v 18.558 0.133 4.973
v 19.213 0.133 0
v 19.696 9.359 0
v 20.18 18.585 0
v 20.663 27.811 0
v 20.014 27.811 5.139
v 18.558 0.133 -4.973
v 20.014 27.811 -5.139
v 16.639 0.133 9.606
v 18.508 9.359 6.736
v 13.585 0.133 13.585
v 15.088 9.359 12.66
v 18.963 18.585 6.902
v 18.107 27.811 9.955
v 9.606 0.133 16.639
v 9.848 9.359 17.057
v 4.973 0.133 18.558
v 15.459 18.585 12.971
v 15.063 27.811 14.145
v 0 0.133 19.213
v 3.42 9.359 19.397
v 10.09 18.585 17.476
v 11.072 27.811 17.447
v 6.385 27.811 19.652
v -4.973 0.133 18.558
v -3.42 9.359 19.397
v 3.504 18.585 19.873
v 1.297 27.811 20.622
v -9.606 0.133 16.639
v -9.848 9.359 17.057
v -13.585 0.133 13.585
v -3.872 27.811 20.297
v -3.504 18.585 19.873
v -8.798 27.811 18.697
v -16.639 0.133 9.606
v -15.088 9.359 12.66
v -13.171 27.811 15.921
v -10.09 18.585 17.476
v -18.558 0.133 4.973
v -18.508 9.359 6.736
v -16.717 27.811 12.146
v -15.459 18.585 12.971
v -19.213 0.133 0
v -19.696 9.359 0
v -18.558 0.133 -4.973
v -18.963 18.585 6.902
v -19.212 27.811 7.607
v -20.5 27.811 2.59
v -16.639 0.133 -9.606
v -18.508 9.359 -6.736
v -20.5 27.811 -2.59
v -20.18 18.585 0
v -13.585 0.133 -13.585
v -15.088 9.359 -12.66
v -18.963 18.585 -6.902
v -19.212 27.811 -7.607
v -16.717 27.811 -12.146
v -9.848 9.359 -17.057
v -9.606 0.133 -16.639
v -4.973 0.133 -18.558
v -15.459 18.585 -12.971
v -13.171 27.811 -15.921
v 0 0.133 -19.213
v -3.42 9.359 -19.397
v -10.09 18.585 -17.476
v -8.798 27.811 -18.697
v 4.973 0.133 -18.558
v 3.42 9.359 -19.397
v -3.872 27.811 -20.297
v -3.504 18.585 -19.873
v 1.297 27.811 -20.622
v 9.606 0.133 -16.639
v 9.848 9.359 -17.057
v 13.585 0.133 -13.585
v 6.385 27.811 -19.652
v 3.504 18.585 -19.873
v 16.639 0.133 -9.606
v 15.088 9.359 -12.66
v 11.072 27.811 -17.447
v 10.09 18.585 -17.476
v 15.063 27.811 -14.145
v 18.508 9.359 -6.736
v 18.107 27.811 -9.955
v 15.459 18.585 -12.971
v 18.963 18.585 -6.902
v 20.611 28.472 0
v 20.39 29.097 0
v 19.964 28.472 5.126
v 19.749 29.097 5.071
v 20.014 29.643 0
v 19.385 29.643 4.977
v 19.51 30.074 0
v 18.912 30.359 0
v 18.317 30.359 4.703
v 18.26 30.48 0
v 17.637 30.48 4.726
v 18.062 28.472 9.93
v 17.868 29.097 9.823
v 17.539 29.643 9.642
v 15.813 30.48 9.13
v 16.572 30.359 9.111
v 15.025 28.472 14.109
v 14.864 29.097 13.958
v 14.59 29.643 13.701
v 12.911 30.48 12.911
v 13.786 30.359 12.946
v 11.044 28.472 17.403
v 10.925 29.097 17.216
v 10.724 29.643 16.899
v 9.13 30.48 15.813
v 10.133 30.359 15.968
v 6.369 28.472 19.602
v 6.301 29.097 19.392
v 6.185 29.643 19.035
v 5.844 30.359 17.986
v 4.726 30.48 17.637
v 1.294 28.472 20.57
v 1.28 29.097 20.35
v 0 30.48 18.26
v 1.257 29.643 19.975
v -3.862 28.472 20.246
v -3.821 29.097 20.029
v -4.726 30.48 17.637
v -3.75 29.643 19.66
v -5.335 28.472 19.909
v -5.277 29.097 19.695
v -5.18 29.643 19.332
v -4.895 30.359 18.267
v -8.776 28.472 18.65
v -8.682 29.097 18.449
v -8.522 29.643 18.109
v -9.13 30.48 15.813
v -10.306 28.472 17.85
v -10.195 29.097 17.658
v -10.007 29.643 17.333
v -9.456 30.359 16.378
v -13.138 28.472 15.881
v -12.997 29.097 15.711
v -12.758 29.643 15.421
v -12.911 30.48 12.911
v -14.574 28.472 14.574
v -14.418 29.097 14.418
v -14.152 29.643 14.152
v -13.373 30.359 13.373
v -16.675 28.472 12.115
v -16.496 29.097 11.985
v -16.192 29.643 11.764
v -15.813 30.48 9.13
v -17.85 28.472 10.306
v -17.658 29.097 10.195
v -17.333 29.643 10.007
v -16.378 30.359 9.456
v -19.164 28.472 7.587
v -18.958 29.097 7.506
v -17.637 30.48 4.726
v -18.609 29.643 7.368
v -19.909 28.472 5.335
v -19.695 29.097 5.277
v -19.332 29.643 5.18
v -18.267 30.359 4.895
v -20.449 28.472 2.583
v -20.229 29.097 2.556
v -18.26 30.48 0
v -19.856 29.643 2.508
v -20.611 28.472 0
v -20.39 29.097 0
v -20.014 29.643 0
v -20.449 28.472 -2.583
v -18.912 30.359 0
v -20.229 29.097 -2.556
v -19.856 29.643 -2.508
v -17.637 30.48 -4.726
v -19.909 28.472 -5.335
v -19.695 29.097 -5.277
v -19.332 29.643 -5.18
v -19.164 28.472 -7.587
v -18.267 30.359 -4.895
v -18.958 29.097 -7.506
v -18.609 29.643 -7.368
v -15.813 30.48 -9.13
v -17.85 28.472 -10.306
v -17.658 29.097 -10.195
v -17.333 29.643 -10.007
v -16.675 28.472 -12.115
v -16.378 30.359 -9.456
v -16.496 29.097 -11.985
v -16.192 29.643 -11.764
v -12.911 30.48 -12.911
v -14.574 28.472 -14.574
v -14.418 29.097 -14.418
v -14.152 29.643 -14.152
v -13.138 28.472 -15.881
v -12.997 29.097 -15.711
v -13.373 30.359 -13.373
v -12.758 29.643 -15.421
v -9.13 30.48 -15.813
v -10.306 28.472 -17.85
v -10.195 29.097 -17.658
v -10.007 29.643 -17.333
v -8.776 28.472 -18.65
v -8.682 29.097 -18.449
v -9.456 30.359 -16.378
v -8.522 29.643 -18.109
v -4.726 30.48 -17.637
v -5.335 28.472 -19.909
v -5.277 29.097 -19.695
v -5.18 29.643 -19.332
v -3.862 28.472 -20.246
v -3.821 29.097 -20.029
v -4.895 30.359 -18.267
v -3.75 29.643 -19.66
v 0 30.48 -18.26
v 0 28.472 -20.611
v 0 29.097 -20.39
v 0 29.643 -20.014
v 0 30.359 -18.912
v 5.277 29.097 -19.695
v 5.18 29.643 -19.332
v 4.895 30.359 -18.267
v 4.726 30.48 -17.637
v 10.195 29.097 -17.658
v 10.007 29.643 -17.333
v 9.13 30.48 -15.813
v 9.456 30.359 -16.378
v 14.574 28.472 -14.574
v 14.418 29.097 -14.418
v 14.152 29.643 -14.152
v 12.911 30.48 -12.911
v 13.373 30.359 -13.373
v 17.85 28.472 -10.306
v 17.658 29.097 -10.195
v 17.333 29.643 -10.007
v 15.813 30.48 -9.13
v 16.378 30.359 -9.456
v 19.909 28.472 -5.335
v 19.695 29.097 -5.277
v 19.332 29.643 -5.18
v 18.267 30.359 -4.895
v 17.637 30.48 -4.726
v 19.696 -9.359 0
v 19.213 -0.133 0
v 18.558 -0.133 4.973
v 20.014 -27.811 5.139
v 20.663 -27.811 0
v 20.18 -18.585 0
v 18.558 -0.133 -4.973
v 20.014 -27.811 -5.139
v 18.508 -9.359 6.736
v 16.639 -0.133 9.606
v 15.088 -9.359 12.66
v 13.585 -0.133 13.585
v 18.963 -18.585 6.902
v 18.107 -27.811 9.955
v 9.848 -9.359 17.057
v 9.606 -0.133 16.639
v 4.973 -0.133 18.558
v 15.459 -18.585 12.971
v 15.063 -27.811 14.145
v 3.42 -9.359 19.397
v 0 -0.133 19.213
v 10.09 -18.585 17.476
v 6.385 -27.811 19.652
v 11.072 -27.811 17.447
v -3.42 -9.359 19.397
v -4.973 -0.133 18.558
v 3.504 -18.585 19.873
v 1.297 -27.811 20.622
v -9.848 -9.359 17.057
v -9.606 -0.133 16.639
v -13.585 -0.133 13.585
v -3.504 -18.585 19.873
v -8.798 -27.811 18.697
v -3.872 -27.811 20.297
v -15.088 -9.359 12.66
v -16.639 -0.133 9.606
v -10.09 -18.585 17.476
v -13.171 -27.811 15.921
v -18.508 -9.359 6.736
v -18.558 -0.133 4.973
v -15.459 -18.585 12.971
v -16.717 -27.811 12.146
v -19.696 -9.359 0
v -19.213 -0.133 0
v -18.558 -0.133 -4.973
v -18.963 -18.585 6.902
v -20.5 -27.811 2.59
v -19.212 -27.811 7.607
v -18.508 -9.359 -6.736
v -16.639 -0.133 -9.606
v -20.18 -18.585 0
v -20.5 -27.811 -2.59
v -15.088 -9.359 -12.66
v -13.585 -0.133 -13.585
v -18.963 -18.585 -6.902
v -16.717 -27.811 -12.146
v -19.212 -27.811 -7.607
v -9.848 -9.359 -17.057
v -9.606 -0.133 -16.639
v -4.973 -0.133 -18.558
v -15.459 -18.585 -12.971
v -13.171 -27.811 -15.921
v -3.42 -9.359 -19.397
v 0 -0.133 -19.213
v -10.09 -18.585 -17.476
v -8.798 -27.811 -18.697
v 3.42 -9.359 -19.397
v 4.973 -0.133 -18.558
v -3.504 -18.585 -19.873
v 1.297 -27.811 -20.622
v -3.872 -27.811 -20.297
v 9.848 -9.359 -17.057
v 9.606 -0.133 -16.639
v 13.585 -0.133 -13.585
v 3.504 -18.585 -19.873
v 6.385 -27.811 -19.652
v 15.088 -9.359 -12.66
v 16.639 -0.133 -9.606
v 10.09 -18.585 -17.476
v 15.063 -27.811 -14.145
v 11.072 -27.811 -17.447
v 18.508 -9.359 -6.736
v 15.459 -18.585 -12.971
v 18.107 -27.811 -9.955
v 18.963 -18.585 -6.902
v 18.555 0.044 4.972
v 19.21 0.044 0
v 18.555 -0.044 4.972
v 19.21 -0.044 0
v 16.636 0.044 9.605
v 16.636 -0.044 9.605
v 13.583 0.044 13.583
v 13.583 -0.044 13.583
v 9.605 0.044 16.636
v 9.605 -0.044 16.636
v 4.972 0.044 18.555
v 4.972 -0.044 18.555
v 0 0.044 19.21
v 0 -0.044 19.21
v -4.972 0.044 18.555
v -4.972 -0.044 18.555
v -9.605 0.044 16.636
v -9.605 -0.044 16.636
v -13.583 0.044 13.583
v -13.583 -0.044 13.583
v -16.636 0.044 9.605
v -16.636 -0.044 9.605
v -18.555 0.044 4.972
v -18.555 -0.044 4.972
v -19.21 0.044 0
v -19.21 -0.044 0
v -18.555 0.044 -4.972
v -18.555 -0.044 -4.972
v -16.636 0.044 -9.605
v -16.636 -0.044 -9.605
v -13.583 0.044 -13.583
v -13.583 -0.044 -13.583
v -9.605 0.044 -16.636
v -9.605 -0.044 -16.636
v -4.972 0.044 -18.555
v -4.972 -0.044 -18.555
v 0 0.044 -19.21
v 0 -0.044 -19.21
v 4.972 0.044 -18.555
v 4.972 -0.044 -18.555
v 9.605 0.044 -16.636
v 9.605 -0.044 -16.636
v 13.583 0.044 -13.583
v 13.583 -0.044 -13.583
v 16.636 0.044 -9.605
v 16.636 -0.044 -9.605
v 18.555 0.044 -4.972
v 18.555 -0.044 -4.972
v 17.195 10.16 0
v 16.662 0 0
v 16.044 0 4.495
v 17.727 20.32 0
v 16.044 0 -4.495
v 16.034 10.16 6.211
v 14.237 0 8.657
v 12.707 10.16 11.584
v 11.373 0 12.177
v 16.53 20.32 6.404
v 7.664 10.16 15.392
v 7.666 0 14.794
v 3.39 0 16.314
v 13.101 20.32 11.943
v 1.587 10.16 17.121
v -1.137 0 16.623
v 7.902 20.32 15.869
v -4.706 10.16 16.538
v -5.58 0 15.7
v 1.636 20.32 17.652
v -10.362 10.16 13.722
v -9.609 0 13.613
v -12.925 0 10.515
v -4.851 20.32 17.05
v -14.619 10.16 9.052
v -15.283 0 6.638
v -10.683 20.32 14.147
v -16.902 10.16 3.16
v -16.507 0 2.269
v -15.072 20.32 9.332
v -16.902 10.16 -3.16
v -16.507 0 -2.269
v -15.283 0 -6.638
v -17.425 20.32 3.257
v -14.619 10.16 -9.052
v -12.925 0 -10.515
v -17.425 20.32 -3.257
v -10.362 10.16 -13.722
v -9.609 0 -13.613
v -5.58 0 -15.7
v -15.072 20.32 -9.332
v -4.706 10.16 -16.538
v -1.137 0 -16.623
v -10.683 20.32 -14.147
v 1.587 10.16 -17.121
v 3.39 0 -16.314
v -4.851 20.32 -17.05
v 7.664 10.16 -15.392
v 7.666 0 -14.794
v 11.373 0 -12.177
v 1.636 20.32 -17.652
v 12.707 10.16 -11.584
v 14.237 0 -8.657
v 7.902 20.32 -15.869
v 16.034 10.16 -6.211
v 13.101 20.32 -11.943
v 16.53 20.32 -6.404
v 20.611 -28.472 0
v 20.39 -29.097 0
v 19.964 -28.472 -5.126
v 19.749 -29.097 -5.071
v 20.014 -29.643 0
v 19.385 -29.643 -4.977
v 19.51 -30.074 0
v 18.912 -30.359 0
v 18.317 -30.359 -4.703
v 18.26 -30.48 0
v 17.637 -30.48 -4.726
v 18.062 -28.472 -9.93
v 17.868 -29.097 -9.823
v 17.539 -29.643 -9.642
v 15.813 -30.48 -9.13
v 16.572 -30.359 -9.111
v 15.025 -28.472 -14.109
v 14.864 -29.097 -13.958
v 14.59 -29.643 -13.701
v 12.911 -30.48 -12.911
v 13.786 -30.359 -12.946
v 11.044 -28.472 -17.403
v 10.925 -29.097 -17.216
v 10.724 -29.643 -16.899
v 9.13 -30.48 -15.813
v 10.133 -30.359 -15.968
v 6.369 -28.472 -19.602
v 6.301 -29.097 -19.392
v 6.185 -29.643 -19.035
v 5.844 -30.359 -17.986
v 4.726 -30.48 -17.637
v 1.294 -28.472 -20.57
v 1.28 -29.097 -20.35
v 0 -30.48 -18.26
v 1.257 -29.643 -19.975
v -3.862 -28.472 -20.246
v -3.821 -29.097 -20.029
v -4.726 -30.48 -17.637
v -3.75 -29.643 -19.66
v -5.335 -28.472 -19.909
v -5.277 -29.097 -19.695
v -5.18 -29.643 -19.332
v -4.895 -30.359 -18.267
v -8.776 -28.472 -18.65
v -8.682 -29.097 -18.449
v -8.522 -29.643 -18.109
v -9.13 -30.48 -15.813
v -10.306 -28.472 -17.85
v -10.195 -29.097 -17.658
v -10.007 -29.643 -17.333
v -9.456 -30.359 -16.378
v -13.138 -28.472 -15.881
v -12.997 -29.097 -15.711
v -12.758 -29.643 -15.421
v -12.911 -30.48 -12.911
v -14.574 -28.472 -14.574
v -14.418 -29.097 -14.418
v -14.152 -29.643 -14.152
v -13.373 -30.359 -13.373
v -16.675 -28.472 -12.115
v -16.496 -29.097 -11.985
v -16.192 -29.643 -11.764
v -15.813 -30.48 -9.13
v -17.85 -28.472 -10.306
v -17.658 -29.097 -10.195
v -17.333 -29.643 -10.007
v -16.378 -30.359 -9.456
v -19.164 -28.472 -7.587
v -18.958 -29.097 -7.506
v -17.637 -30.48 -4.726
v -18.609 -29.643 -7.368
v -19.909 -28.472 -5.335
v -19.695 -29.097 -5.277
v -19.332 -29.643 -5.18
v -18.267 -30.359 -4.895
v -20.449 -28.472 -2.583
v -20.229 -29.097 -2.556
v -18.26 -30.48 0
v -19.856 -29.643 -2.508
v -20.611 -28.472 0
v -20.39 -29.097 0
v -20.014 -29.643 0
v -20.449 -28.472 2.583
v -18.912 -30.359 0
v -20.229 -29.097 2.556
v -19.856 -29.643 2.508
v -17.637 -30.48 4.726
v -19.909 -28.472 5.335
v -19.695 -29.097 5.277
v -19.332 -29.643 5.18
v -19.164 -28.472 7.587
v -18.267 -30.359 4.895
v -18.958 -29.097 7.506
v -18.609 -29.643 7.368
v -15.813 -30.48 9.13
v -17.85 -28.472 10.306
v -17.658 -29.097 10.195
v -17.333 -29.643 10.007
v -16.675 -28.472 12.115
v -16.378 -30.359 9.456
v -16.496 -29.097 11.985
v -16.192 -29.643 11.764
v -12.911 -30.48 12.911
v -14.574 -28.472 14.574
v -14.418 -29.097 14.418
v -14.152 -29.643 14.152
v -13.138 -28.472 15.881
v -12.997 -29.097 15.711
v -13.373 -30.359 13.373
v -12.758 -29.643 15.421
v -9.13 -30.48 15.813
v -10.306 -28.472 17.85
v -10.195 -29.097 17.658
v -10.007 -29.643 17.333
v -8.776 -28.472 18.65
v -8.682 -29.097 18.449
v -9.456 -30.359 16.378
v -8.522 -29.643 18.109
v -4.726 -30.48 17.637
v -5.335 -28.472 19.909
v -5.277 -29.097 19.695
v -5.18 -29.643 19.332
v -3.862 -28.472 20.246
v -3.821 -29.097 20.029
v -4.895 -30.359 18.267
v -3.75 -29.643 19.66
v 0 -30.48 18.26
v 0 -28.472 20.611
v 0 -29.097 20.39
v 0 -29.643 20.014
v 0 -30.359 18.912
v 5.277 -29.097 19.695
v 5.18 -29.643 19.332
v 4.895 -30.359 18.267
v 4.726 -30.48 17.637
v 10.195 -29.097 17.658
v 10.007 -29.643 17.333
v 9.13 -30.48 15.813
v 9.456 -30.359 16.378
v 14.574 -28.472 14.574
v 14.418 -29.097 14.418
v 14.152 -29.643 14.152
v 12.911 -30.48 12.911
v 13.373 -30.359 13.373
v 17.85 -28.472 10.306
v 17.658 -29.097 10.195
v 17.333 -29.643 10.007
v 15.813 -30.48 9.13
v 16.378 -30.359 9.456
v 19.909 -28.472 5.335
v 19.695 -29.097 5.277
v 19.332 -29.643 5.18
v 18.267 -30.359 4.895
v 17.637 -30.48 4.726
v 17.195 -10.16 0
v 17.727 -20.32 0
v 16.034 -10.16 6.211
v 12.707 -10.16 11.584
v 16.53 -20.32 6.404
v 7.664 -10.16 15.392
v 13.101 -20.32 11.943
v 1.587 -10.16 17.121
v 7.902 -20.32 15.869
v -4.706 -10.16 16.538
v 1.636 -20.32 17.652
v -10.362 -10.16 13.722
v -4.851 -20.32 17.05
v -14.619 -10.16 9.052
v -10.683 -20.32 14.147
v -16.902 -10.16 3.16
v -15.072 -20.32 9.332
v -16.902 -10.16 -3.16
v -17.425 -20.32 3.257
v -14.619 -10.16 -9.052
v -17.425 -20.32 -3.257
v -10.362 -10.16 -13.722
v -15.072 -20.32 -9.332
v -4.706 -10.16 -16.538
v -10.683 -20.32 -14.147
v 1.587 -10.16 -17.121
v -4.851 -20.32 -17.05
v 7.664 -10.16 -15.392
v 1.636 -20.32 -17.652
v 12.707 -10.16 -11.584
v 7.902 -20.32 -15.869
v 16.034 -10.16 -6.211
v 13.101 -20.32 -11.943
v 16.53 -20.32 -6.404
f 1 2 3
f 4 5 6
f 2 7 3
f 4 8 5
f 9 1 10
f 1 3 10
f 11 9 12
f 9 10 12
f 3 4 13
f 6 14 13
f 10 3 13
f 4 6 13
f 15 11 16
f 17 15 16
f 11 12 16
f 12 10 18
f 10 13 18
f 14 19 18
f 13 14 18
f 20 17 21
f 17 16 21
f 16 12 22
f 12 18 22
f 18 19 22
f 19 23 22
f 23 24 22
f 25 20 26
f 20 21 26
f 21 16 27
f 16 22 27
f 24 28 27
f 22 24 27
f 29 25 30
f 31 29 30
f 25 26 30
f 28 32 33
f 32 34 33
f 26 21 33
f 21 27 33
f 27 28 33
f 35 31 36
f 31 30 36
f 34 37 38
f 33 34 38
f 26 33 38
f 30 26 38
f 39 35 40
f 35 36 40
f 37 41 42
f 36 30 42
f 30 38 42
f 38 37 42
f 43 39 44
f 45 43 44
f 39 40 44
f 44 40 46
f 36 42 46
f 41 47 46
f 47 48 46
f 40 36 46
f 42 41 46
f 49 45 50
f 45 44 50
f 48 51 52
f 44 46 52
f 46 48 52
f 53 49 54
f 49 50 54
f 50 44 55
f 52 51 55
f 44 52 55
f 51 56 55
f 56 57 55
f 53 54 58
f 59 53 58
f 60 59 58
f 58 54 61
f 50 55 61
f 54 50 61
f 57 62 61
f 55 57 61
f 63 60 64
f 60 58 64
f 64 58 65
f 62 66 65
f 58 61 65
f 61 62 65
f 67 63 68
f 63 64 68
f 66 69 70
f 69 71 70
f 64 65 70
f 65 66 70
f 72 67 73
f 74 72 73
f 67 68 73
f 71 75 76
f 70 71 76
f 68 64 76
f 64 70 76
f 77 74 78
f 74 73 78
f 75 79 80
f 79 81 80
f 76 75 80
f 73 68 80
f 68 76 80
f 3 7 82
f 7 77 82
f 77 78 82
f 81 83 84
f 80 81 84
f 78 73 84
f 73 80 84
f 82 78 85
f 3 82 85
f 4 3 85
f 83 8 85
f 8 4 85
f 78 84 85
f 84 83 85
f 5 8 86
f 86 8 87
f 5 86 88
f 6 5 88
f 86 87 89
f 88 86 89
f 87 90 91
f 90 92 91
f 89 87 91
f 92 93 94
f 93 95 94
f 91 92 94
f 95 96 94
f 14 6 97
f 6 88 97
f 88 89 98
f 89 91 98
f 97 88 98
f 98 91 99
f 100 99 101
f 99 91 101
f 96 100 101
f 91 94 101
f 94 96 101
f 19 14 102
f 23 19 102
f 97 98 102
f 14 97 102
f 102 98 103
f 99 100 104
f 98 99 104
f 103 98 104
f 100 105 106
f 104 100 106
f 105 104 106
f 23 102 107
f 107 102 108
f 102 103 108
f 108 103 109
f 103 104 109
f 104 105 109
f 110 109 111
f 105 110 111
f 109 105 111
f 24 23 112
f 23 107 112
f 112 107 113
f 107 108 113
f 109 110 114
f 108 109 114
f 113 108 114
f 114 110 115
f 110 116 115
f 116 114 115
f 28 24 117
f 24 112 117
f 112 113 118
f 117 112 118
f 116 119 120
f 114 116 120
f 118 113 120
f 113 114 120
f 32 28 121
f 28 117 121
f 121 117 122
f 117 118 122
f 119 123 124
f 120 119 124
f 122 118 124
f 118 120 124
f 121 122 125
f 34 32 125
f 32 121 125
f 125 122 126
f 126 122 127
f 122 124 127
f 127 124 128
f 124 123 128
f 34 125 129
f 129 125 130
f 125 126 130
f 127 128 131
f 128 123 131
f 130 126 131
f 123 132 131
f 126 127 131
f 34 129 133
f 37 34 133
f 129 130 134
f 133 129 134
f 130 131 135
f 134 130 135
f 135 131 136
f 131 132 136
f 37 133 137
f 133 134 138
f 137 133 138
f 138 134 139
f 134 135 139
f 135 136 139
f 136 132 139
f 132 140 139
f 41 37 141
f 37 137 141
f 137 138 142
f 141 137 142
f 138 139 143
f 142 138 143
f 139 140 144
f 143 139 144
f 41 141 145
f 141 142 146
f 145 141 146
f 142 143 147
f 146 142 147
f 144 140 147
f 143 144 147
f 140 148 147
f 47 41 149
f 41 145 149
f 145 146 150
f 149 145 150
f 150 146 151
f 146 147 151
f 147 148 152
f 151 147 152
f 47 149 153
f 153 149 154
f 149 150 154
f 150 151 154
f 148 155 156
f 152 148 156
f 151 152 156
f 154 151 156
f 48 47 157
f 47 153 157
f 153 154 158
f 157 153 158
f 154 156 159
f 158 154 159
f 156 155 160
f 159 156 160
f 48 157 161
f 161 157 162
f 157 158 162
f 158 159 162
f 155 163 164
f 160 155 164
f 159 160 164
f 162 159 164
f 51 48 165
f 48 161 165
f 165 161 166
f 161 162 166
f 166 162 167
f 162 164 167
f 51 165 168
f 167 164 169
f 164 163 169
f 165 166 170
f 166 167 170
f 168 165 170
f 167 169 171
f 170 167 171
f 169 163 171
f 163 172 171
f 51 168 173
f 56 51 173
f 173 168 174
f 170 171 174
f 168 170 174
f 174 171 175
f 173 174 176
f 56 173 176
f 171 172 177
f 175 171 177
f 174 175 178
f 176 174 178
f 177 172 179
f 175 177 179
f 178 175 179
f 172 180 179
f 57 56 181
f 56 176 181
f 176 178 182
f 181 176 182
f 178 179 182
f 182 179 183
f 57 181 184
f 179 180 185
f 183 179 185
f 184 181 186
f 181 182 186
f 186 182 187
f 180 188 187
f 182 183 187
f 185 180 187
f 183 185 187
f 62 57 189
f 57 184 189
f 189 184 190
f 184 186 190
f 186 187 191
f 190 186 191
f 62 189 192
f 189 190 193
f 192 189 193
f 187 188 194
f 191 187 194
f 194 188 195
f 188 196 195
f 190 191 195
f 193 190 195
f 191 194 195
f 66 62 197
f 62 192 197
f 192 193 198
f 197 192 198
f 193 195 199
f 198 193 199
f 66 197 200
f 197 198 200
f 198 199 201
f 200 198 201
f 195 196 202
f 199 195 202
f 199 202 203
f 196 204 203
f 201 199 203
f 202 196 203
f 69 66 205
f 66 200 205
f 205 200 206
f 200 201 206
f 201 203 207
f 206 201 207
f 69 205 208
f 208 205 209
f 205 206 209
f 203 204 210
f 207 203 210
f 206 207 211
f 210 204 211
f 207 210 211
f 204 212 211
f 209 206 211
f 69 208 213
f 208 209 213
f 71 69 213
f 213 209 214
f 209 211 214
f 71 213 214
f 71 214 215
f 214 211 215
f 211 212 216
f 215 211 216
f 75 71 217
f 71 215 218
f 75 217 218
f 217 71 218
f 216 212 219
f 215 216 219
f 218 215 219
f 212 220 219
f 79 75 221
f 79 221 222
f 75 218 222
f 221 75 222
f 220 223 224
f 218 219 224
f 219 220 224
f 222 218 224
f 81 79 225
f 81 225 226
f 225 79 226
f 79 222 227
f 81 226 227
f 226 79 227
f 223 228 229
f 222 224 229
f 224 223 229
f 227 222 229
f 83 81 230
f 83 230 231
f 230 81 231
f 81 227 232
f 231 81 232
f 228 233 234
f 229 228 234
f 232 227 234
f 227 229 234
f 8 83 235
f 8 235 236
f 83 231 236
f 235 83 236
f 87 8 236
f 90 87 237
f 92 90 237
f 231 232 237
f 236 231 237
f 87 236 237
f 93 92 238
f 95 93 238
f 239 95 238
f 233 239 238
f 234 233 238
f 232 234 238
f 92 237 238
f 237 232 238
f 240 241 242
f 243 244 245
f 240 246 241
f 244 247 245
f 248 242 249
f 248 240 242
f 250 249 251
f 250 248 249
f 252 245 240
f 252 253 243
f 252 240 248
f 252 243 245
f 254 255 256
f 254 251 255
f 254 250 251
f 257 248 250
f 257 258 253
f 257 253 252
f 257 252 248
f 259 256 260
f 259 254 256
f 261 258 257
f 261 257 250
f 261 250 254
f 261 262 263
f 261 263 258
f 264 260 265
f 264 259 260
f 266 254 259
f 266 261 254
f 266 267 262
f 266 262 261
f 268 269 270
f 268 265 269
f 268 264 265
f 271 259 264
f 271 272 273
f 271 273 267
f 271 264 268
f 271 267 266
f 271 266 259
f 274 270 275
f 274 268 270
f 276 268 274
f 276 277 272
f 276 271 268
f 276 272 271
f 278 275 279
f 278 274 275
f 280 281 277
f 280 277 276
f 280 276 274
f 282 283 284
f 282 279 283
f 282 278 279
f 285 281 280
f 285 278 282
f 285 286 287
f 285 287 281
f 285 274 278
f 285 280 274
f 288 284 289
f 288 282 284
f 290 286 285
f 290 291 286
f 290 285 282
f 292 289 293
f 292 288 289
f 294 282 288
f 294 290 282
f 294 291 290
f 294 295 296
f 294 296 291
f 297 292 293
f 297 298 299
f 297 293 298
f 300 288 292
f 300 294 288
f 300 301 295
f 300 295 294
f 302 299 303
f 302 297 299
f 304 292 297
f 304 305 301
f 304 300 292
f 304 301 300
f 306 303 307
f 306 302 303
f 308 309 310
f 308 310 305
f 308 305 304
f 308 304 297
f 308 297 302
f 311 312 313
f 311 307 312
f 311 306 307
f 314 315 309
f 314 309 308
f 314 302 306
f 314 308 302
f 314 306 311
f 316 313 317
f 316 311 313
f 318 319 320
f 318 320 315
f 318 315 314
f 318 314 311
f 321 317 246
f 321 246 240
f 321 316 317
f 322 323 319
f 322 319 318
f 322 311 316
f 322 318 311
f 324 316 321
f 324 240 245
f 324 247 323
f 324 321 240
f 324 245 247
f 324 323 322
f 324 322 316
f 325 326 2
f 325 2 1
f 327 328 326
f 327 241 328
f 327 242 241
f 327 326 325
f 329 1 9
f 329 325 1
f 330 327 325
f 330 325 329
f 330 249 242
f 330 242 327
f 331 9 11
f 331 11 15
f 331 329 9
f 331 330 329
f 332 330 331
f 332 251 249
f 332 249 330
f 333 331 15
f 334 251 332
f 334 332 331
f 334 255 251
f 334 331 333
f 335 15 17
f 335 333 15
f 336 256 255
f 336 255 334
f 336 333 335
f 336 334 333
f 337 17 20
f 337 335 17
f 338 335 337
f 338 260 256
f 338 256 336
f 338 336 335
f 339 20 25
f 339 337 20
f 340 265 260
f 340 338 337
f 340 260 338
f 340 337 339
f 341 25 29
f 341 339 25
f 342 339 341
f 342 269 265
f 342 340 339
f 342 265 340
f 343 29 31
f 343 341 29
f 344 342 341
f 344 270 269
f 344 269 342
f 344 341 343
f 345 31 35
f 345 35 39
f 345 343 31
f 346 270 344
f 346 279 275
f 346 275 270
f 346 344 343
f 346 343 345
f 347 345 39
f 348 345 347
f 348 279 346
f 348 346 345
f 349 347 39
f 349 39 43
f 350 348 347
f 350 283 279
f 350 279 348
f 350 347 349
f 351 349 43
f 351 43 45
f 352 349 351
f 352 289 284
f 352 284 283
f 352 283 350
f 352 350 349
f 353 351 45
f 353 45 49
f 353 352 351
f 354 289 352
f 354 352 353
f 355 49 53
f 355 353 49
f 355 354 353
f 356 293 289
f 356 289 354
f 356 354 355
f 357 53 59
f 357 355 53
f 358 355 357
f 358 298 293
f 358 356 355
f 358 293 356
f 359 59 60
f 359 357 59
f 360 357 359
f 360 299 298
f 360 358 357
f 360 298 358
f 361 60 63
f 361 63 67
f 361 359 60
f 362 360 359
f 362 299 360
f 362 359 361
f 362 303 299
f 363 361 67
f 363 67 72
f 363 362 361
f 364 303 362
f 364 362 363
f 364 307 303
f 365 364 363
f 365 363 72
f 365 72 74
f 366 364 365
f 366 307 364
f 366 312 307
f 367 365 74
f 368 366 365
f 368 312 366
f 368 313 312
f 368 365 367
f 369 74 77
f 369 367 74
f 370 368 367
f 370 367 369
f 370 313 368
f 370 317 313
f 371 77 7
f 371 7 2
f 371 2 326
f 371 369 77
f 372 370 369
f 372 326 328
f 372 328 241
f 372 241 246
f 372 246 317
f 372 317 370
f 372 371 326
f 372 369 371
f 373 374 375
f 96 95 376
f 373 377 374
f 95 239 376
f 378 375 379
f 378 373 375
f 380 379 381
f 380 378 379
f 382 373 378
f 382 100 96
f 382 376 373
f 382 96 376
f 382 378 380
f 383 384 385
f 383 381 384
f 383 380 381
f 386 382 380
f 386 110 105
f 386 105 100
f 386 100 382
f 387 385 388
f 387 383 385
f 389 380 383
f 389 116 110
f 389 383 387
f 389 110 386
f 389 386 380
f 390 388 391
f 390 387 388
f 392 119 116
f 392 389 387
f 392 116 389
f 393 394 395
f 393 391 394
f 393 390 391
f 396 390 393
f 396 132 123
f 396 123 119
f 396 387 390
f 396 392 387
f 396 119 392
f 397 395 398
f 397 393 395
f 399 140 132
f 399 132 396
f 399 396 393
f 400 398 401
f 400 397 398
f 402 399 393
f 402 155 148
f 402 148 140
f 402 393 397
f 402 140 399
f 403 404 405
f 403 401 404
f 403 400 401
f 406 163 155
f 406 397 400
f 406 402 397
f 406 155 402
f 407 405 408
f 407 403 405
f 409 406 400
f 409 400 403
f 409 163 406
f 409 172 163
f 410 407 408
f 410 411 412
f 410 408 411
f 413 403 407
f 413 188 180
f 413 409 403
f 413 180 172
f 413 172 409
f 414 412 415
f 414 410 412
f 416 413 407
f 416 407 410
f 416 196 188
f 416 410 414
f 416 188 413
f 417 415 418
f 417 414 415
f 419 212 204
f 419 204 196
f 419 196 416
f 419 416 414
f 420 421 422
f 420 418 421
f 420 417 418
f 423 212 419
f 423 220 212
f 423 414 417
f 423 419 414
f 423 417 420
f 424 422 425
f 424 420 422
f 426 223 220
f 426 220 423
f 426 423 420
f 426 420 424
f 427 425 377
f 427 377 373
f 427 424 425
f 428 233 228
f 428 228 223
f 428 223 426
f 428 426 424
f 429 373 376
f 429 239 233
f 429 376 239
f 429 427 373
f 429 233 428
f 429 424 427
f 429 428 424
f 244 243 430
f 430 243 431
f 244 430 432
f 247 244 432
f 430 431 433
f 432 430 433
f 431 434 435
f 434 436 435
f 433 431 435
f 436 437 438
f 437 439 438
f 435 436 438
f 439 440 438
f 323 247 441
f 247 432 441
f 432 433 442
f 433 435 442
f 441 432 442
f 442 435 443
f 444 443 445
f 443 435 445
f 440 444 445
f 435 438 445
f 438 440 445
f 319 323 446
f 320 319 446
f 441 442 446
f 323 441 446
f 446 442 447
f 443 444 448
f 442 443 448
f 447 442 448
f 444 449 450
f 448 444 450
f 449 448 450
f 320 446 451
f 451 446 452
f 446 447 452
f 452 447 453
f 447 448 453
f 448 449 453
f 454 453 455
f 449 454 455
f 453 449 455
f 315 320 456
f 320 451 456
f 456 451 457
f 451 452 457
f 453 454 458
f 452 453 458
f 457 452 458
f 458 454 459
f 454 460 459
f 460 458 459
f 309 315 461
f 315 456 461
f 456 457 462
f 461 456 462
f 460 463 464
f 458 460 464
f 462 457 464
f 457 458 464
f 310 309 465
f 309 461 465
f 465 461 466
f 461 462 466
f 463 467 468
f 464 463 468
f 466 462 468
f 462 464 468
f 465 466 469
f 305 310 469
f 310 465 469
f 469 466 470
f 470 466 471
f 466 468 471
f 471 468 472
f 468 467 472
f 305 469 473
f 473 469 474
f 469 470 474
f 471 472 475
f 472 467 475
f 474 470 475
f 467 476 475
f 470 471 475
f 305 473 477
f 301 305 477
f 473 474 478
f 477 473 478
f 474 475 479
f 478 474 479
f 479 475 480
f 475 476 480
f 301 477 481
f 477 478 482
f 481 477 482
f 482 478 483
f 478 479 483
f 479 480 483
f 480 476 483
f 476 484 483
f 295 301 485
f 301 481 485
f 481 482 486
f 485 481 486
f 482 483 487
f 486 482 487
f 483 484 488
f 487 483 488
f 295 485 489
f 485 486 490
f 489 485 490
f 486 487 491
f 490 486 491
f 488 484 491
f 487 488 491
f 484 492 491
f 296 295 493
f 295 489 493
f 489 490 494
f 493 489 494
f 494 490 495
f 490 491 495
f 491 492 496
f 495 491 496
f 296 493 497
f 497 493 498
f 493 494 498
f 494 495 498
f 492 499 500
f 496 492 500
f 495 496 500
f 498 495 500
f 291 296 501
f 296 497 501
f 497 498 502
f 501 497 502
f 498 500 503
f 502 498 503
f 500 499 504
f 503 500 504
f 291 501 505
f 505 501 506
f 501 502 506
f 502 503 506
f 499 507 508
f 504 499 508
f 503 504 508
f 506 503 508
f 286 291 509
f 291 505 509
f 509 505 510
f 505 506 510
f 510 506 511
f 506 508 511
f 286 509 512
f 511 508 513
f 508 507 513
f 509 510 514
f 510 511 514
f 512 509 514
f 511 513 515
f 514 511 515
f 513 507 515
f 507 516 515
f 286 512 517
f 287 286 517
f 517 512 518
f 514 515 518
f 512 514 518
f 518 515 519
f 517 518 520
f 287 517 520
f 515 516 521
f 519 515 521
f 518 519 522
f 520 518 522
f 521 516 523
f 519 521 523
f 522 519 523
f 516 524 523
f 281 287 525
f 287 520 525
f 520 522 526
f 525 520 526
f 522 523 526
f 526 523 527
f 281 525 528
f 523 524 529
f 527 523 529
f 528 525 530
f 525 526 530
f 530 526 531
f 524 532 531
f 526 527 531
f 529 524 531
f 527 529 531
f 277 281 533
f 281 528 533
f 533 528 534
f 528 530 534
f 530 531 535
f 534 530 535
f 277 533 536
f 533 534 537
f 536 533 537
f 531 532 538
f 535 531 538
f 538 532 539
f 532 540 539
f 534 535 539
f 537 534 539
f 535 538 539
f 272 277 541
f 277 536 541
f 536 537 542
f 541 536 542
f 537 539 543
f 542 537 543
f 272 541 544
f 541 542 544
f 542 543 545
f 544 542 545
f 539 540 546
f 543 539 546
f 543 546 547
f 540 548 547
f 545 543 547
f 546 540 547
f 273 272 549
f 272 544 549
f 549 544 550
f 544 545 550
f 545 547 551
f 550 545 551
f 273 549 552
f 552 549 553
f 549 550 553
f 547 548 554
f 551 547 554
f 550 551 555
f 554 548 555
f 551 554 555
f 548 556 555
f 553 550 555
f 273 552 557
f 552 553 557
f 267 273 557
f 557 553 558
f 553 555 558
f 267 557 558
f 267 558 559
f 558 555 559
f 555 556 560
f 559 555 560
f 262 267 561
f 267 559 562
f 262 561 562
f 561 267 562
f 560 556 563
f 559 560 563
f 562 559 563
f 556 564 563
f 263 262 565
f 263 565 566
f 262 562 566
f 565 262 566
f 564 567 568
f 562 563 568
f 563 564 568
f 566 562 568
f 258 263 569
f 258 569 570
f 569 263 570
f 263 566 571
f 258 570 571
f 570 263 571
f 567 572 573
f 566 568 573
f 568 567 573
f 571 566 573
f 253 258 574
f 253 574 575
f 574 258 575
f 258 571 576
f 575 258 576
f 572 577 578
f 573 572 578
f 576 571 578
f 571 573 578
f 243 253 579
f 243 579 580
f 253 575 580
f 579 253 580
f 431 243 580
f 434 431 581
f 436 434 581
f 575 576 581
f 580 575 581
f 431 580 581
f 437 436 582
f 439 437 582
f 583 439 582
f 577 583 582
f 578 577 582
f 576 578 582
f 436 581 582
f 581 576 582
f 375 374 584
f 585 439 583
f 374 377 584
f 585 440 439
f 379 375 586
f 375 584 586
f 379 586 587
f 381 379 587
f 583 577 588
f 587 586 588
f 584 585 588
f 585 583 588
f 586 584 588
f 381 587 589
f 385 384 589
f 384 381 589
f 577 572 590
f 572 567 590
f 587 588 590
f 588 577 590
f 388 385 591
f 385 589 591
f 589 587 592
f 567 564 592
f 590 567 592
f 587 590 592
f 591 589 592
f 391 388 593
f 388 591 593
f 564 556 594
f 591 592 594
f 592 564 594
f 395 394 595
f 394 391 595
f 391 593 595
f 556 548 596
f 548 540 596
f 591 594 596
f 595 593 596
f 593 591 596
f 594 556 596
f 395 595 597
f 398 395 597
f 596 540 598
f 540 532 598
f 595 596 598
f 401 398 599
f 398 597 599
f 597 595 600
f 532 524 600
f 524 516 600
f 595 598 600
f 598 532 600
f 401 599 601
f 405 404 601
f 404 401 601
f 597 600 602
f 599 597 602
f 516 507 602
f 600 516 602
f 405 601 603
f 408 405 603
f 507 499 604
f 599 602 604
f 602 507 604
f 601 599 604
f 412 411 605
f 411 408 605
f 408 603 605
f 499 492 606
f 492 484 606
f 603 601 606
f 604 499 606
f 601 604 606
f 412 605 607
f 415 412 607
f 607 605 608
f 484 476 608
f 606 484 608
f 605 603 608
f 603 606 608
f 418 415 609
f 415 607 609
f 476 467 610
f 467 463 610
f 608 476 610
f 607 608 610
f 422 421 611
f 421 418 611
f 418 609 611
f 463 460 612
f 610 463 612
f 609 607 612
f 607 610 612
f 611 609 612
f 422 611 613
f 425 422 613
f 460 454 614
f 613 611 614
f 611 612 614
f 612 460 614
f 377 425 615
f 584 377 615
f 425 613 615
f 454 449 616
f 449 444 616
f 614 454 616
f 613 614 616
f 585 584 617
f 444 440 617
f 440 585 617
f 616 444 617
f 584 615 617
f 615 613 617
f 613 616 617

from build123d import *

# Parameters (mm, degrees)
F0_R          = 19.2057063742
F1_DEPTH      = 30.48
F1_TAPER      = -3
F1_DEPTH_BACK = 30.48
F1_TAPER_BACK = -3
F2_T          = -2.54


# Not quite as in the source:
# - a fillet or chamfer that OpenCascade refuses, or shapes differently, is made with other operations: its cross-section is extruded or revolved along the edge and cut away or added


with BuildPart() as f1:
    # F0 (on Front) → F1 (new body, two sides)
    with BuildSketch(Plane.XZ) as f1_sk:
        Circle(F0_R)
    extrude(amount=F1_DEPTH, taper=F1_TAPER)
    extrude(f1_sk.sketch, amount=-F1_DEPTH_BACK, taper=F1_TAPER_BACK)

    # F2
    f2_openings = [f1.faces().sort_by_distance(p)[0] for p in [
        (0, -30.48, 0),
        (0, 30.48, 0),
    ]]
    offset(amount=F2_T, openings=f2_openings, kind=Kind.INTERSECTION)

    # F3: fillet of radius 2.54 on 3 edges, made by hand

    # F3_s1 → F3_t2 (revolve)
    with BuildSketch(Plane.XY):
        with BuildLine():
            ThreePointArc((19.2126731148, 0.1329333289), (19.2091921331, 0), (19.2126731148, -0.1329333289))
            Line((19.2126731148, -0.1329333289), (19.1619427344, -0.1355919954))
            Line((19.1619427344, -0.1355919954), (19.1548366591, 0))
            Line((19.1548366591, 0), (19.1619427344, 0.1355919954))
            Line((19.1619427344, 0.1355919954), (19.2126731148, 0.1329333289))
        make_face()
    revolve(axis=Axis((0, 0, 0), (0, -1, 0)))

    # F3_s3 → F3_t4 (revolve, cut)
    with BuildSketch(Plane.XY):
        with BuildLine():
            ThreePointArc((20.6631954174, 27.8105476529), (20.0142642558, 29.6430727219), (18.2596097279, 30.48))
            Line((18.2596097279, 30.48), (18.2622683945, 30.5307303804))
            ThreePointArc((18.2622683945, 30.5307303804), (19.5313526074, 30.5308), (20.8030954868, 30.5308))
            Line((20.8030954868, 30.5308), (20.8538258671, 30.4773413334))
            Line((20.8538258671, 30.4773413334), (20.7139257977, 27.8078889863))
            Line((20.7139257977, 27.8078889863), (20.6631954174, 27.8105476529))
        make_face()
    revolve(axis=Axis((0, 30.48, 0), (0, -1, 0)), mode=Mode.SUBTRACT)

    # F3_s5 → F3_t6 (revolve, cut)
    with BuildSketch(Plane.XY):
        with BuildLine():
            ThreePointArc((20.6631954174, -27.8105476529), (20.0142642558, -29.6430727219), (18.2596097279, -30.48))
            Line((18.2596097279, -30.48), (18.2622683945, -30.5307303804))
            ThreePointArc((18.2622683945, -30.5307303804), (19.5313526074, -30.5308), (20.8030954868, -30.5308))
            Line((20.8030954868, -30.5308), (20.8538258671, -30.4773413334))
            Line((20.8538258671, -30.4773413334), (20.7139257977, -27.8078889863))
            Line((20.7139257977, -27.8078889863), (20.6631954174, -27.8105476529))
        make_face()
    revolve(axis=Axis((0, -30.48, 0), (0, 1, 0)), mode=Mode.SUBTRACT)


solid = f1.part
